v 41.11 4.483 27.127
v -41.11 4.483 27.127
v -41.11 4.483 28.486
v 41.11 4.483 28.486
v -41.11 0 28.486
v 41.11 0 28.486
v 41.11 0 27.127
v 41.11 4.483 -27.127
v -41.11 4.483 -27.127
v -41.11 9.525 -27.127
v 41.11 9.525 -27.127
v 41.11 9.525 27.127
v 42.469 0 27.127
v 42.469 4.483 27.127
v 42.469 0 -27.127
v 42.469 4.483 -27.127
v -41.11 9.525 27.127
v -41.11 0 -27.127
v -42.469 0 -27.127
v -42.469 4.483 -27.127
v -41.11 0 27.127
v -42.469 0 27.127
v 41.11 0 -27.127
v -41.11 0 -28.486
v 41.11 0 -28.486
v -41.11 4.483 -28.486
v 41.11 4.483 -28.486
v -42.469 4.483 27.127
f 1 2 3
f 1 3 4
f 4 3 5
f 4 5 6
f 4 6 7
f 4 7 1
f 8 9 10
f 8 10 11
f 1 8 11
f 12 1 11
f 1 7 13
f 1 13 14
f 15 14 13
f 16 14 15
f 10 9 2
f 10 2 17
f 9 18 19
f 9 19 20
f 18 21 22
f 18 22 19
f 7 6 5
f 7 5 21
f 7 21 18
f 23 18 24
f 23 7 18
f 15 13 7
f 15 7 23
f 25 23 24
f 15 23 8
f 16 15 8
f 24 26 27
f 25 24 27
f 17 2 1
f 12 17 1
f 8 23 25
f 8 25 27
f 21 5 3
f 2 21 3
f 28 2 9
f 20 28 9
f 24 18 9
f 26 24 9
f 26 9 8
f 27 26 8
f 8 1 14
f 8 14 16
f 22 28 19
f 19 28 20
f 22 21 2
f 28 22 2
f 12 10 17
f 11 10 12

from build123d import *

# Parameters (mm, degrees)
SKETCH1_W           = 82.2198
SKETCH1_H           = 54.2544
BOSS_EXTRUDE1_DEPTH = 9.525
SKETCH2_W           = 82.2198
SKETCH2_H           = 4.4831
BOSS_EXTRUDE2_DEPTH = 1.3589
SKETCH3_W           = 54.2544
SKETCH3_H           = 4.4831
BOSS_EXTRUDE3_DEPTH = 1.3589


with BuildPart() as part:
    # Sketch1 → Boss-Extrude1 (new body)
    with BuildSketch(Plane(origin=(0, 0, 0), x_dir=(1, 0, 0), z_dir=(0, 1, 0))):
        Rectangle(SKETCH1_W, SKETCH1_H)
    extrude(amount=BOSS_EXTRUDE1_DEPTH)

    # Sketch2 → Boss-Extrude2 (add)
    with BuildSketch(Plane.XY.offset(27.1272)):
        with Locations((0, 2.24155)):
            Rectangle(SKETCH2_W, SKETCH2_H)
    boss_extrude2 = extrude(amount=BOSS_EXTRUDE2_DEPTH)

    # Mirror1: Boss-Extrude2 across plane
    add(boss_extrude2.mirror(Plane.XY))

    # Sketch3 → Boss-Extrude3 (add)
    with BuildSketch(Plane(origin=(41.1099, 0, 0), x_dir=(0, 0, -1), z_dir=(1, 0, 0))):
        with Locations((0, 2.24155)):
            Rectangle(SKETCH3_W, SKETCH3_H)
    boss_extrude3 = extrude(amount=BOSS_EXTRUDE3_DEPTH)

    # Mirror2: Boss-Extrude3 across plane
    add(boss_extrude3.mirror(Plane(origin=(0, 0, 0), x_dir=(0, 0, 1), z_dir=(1, 0, 0))))


solid = part.part
